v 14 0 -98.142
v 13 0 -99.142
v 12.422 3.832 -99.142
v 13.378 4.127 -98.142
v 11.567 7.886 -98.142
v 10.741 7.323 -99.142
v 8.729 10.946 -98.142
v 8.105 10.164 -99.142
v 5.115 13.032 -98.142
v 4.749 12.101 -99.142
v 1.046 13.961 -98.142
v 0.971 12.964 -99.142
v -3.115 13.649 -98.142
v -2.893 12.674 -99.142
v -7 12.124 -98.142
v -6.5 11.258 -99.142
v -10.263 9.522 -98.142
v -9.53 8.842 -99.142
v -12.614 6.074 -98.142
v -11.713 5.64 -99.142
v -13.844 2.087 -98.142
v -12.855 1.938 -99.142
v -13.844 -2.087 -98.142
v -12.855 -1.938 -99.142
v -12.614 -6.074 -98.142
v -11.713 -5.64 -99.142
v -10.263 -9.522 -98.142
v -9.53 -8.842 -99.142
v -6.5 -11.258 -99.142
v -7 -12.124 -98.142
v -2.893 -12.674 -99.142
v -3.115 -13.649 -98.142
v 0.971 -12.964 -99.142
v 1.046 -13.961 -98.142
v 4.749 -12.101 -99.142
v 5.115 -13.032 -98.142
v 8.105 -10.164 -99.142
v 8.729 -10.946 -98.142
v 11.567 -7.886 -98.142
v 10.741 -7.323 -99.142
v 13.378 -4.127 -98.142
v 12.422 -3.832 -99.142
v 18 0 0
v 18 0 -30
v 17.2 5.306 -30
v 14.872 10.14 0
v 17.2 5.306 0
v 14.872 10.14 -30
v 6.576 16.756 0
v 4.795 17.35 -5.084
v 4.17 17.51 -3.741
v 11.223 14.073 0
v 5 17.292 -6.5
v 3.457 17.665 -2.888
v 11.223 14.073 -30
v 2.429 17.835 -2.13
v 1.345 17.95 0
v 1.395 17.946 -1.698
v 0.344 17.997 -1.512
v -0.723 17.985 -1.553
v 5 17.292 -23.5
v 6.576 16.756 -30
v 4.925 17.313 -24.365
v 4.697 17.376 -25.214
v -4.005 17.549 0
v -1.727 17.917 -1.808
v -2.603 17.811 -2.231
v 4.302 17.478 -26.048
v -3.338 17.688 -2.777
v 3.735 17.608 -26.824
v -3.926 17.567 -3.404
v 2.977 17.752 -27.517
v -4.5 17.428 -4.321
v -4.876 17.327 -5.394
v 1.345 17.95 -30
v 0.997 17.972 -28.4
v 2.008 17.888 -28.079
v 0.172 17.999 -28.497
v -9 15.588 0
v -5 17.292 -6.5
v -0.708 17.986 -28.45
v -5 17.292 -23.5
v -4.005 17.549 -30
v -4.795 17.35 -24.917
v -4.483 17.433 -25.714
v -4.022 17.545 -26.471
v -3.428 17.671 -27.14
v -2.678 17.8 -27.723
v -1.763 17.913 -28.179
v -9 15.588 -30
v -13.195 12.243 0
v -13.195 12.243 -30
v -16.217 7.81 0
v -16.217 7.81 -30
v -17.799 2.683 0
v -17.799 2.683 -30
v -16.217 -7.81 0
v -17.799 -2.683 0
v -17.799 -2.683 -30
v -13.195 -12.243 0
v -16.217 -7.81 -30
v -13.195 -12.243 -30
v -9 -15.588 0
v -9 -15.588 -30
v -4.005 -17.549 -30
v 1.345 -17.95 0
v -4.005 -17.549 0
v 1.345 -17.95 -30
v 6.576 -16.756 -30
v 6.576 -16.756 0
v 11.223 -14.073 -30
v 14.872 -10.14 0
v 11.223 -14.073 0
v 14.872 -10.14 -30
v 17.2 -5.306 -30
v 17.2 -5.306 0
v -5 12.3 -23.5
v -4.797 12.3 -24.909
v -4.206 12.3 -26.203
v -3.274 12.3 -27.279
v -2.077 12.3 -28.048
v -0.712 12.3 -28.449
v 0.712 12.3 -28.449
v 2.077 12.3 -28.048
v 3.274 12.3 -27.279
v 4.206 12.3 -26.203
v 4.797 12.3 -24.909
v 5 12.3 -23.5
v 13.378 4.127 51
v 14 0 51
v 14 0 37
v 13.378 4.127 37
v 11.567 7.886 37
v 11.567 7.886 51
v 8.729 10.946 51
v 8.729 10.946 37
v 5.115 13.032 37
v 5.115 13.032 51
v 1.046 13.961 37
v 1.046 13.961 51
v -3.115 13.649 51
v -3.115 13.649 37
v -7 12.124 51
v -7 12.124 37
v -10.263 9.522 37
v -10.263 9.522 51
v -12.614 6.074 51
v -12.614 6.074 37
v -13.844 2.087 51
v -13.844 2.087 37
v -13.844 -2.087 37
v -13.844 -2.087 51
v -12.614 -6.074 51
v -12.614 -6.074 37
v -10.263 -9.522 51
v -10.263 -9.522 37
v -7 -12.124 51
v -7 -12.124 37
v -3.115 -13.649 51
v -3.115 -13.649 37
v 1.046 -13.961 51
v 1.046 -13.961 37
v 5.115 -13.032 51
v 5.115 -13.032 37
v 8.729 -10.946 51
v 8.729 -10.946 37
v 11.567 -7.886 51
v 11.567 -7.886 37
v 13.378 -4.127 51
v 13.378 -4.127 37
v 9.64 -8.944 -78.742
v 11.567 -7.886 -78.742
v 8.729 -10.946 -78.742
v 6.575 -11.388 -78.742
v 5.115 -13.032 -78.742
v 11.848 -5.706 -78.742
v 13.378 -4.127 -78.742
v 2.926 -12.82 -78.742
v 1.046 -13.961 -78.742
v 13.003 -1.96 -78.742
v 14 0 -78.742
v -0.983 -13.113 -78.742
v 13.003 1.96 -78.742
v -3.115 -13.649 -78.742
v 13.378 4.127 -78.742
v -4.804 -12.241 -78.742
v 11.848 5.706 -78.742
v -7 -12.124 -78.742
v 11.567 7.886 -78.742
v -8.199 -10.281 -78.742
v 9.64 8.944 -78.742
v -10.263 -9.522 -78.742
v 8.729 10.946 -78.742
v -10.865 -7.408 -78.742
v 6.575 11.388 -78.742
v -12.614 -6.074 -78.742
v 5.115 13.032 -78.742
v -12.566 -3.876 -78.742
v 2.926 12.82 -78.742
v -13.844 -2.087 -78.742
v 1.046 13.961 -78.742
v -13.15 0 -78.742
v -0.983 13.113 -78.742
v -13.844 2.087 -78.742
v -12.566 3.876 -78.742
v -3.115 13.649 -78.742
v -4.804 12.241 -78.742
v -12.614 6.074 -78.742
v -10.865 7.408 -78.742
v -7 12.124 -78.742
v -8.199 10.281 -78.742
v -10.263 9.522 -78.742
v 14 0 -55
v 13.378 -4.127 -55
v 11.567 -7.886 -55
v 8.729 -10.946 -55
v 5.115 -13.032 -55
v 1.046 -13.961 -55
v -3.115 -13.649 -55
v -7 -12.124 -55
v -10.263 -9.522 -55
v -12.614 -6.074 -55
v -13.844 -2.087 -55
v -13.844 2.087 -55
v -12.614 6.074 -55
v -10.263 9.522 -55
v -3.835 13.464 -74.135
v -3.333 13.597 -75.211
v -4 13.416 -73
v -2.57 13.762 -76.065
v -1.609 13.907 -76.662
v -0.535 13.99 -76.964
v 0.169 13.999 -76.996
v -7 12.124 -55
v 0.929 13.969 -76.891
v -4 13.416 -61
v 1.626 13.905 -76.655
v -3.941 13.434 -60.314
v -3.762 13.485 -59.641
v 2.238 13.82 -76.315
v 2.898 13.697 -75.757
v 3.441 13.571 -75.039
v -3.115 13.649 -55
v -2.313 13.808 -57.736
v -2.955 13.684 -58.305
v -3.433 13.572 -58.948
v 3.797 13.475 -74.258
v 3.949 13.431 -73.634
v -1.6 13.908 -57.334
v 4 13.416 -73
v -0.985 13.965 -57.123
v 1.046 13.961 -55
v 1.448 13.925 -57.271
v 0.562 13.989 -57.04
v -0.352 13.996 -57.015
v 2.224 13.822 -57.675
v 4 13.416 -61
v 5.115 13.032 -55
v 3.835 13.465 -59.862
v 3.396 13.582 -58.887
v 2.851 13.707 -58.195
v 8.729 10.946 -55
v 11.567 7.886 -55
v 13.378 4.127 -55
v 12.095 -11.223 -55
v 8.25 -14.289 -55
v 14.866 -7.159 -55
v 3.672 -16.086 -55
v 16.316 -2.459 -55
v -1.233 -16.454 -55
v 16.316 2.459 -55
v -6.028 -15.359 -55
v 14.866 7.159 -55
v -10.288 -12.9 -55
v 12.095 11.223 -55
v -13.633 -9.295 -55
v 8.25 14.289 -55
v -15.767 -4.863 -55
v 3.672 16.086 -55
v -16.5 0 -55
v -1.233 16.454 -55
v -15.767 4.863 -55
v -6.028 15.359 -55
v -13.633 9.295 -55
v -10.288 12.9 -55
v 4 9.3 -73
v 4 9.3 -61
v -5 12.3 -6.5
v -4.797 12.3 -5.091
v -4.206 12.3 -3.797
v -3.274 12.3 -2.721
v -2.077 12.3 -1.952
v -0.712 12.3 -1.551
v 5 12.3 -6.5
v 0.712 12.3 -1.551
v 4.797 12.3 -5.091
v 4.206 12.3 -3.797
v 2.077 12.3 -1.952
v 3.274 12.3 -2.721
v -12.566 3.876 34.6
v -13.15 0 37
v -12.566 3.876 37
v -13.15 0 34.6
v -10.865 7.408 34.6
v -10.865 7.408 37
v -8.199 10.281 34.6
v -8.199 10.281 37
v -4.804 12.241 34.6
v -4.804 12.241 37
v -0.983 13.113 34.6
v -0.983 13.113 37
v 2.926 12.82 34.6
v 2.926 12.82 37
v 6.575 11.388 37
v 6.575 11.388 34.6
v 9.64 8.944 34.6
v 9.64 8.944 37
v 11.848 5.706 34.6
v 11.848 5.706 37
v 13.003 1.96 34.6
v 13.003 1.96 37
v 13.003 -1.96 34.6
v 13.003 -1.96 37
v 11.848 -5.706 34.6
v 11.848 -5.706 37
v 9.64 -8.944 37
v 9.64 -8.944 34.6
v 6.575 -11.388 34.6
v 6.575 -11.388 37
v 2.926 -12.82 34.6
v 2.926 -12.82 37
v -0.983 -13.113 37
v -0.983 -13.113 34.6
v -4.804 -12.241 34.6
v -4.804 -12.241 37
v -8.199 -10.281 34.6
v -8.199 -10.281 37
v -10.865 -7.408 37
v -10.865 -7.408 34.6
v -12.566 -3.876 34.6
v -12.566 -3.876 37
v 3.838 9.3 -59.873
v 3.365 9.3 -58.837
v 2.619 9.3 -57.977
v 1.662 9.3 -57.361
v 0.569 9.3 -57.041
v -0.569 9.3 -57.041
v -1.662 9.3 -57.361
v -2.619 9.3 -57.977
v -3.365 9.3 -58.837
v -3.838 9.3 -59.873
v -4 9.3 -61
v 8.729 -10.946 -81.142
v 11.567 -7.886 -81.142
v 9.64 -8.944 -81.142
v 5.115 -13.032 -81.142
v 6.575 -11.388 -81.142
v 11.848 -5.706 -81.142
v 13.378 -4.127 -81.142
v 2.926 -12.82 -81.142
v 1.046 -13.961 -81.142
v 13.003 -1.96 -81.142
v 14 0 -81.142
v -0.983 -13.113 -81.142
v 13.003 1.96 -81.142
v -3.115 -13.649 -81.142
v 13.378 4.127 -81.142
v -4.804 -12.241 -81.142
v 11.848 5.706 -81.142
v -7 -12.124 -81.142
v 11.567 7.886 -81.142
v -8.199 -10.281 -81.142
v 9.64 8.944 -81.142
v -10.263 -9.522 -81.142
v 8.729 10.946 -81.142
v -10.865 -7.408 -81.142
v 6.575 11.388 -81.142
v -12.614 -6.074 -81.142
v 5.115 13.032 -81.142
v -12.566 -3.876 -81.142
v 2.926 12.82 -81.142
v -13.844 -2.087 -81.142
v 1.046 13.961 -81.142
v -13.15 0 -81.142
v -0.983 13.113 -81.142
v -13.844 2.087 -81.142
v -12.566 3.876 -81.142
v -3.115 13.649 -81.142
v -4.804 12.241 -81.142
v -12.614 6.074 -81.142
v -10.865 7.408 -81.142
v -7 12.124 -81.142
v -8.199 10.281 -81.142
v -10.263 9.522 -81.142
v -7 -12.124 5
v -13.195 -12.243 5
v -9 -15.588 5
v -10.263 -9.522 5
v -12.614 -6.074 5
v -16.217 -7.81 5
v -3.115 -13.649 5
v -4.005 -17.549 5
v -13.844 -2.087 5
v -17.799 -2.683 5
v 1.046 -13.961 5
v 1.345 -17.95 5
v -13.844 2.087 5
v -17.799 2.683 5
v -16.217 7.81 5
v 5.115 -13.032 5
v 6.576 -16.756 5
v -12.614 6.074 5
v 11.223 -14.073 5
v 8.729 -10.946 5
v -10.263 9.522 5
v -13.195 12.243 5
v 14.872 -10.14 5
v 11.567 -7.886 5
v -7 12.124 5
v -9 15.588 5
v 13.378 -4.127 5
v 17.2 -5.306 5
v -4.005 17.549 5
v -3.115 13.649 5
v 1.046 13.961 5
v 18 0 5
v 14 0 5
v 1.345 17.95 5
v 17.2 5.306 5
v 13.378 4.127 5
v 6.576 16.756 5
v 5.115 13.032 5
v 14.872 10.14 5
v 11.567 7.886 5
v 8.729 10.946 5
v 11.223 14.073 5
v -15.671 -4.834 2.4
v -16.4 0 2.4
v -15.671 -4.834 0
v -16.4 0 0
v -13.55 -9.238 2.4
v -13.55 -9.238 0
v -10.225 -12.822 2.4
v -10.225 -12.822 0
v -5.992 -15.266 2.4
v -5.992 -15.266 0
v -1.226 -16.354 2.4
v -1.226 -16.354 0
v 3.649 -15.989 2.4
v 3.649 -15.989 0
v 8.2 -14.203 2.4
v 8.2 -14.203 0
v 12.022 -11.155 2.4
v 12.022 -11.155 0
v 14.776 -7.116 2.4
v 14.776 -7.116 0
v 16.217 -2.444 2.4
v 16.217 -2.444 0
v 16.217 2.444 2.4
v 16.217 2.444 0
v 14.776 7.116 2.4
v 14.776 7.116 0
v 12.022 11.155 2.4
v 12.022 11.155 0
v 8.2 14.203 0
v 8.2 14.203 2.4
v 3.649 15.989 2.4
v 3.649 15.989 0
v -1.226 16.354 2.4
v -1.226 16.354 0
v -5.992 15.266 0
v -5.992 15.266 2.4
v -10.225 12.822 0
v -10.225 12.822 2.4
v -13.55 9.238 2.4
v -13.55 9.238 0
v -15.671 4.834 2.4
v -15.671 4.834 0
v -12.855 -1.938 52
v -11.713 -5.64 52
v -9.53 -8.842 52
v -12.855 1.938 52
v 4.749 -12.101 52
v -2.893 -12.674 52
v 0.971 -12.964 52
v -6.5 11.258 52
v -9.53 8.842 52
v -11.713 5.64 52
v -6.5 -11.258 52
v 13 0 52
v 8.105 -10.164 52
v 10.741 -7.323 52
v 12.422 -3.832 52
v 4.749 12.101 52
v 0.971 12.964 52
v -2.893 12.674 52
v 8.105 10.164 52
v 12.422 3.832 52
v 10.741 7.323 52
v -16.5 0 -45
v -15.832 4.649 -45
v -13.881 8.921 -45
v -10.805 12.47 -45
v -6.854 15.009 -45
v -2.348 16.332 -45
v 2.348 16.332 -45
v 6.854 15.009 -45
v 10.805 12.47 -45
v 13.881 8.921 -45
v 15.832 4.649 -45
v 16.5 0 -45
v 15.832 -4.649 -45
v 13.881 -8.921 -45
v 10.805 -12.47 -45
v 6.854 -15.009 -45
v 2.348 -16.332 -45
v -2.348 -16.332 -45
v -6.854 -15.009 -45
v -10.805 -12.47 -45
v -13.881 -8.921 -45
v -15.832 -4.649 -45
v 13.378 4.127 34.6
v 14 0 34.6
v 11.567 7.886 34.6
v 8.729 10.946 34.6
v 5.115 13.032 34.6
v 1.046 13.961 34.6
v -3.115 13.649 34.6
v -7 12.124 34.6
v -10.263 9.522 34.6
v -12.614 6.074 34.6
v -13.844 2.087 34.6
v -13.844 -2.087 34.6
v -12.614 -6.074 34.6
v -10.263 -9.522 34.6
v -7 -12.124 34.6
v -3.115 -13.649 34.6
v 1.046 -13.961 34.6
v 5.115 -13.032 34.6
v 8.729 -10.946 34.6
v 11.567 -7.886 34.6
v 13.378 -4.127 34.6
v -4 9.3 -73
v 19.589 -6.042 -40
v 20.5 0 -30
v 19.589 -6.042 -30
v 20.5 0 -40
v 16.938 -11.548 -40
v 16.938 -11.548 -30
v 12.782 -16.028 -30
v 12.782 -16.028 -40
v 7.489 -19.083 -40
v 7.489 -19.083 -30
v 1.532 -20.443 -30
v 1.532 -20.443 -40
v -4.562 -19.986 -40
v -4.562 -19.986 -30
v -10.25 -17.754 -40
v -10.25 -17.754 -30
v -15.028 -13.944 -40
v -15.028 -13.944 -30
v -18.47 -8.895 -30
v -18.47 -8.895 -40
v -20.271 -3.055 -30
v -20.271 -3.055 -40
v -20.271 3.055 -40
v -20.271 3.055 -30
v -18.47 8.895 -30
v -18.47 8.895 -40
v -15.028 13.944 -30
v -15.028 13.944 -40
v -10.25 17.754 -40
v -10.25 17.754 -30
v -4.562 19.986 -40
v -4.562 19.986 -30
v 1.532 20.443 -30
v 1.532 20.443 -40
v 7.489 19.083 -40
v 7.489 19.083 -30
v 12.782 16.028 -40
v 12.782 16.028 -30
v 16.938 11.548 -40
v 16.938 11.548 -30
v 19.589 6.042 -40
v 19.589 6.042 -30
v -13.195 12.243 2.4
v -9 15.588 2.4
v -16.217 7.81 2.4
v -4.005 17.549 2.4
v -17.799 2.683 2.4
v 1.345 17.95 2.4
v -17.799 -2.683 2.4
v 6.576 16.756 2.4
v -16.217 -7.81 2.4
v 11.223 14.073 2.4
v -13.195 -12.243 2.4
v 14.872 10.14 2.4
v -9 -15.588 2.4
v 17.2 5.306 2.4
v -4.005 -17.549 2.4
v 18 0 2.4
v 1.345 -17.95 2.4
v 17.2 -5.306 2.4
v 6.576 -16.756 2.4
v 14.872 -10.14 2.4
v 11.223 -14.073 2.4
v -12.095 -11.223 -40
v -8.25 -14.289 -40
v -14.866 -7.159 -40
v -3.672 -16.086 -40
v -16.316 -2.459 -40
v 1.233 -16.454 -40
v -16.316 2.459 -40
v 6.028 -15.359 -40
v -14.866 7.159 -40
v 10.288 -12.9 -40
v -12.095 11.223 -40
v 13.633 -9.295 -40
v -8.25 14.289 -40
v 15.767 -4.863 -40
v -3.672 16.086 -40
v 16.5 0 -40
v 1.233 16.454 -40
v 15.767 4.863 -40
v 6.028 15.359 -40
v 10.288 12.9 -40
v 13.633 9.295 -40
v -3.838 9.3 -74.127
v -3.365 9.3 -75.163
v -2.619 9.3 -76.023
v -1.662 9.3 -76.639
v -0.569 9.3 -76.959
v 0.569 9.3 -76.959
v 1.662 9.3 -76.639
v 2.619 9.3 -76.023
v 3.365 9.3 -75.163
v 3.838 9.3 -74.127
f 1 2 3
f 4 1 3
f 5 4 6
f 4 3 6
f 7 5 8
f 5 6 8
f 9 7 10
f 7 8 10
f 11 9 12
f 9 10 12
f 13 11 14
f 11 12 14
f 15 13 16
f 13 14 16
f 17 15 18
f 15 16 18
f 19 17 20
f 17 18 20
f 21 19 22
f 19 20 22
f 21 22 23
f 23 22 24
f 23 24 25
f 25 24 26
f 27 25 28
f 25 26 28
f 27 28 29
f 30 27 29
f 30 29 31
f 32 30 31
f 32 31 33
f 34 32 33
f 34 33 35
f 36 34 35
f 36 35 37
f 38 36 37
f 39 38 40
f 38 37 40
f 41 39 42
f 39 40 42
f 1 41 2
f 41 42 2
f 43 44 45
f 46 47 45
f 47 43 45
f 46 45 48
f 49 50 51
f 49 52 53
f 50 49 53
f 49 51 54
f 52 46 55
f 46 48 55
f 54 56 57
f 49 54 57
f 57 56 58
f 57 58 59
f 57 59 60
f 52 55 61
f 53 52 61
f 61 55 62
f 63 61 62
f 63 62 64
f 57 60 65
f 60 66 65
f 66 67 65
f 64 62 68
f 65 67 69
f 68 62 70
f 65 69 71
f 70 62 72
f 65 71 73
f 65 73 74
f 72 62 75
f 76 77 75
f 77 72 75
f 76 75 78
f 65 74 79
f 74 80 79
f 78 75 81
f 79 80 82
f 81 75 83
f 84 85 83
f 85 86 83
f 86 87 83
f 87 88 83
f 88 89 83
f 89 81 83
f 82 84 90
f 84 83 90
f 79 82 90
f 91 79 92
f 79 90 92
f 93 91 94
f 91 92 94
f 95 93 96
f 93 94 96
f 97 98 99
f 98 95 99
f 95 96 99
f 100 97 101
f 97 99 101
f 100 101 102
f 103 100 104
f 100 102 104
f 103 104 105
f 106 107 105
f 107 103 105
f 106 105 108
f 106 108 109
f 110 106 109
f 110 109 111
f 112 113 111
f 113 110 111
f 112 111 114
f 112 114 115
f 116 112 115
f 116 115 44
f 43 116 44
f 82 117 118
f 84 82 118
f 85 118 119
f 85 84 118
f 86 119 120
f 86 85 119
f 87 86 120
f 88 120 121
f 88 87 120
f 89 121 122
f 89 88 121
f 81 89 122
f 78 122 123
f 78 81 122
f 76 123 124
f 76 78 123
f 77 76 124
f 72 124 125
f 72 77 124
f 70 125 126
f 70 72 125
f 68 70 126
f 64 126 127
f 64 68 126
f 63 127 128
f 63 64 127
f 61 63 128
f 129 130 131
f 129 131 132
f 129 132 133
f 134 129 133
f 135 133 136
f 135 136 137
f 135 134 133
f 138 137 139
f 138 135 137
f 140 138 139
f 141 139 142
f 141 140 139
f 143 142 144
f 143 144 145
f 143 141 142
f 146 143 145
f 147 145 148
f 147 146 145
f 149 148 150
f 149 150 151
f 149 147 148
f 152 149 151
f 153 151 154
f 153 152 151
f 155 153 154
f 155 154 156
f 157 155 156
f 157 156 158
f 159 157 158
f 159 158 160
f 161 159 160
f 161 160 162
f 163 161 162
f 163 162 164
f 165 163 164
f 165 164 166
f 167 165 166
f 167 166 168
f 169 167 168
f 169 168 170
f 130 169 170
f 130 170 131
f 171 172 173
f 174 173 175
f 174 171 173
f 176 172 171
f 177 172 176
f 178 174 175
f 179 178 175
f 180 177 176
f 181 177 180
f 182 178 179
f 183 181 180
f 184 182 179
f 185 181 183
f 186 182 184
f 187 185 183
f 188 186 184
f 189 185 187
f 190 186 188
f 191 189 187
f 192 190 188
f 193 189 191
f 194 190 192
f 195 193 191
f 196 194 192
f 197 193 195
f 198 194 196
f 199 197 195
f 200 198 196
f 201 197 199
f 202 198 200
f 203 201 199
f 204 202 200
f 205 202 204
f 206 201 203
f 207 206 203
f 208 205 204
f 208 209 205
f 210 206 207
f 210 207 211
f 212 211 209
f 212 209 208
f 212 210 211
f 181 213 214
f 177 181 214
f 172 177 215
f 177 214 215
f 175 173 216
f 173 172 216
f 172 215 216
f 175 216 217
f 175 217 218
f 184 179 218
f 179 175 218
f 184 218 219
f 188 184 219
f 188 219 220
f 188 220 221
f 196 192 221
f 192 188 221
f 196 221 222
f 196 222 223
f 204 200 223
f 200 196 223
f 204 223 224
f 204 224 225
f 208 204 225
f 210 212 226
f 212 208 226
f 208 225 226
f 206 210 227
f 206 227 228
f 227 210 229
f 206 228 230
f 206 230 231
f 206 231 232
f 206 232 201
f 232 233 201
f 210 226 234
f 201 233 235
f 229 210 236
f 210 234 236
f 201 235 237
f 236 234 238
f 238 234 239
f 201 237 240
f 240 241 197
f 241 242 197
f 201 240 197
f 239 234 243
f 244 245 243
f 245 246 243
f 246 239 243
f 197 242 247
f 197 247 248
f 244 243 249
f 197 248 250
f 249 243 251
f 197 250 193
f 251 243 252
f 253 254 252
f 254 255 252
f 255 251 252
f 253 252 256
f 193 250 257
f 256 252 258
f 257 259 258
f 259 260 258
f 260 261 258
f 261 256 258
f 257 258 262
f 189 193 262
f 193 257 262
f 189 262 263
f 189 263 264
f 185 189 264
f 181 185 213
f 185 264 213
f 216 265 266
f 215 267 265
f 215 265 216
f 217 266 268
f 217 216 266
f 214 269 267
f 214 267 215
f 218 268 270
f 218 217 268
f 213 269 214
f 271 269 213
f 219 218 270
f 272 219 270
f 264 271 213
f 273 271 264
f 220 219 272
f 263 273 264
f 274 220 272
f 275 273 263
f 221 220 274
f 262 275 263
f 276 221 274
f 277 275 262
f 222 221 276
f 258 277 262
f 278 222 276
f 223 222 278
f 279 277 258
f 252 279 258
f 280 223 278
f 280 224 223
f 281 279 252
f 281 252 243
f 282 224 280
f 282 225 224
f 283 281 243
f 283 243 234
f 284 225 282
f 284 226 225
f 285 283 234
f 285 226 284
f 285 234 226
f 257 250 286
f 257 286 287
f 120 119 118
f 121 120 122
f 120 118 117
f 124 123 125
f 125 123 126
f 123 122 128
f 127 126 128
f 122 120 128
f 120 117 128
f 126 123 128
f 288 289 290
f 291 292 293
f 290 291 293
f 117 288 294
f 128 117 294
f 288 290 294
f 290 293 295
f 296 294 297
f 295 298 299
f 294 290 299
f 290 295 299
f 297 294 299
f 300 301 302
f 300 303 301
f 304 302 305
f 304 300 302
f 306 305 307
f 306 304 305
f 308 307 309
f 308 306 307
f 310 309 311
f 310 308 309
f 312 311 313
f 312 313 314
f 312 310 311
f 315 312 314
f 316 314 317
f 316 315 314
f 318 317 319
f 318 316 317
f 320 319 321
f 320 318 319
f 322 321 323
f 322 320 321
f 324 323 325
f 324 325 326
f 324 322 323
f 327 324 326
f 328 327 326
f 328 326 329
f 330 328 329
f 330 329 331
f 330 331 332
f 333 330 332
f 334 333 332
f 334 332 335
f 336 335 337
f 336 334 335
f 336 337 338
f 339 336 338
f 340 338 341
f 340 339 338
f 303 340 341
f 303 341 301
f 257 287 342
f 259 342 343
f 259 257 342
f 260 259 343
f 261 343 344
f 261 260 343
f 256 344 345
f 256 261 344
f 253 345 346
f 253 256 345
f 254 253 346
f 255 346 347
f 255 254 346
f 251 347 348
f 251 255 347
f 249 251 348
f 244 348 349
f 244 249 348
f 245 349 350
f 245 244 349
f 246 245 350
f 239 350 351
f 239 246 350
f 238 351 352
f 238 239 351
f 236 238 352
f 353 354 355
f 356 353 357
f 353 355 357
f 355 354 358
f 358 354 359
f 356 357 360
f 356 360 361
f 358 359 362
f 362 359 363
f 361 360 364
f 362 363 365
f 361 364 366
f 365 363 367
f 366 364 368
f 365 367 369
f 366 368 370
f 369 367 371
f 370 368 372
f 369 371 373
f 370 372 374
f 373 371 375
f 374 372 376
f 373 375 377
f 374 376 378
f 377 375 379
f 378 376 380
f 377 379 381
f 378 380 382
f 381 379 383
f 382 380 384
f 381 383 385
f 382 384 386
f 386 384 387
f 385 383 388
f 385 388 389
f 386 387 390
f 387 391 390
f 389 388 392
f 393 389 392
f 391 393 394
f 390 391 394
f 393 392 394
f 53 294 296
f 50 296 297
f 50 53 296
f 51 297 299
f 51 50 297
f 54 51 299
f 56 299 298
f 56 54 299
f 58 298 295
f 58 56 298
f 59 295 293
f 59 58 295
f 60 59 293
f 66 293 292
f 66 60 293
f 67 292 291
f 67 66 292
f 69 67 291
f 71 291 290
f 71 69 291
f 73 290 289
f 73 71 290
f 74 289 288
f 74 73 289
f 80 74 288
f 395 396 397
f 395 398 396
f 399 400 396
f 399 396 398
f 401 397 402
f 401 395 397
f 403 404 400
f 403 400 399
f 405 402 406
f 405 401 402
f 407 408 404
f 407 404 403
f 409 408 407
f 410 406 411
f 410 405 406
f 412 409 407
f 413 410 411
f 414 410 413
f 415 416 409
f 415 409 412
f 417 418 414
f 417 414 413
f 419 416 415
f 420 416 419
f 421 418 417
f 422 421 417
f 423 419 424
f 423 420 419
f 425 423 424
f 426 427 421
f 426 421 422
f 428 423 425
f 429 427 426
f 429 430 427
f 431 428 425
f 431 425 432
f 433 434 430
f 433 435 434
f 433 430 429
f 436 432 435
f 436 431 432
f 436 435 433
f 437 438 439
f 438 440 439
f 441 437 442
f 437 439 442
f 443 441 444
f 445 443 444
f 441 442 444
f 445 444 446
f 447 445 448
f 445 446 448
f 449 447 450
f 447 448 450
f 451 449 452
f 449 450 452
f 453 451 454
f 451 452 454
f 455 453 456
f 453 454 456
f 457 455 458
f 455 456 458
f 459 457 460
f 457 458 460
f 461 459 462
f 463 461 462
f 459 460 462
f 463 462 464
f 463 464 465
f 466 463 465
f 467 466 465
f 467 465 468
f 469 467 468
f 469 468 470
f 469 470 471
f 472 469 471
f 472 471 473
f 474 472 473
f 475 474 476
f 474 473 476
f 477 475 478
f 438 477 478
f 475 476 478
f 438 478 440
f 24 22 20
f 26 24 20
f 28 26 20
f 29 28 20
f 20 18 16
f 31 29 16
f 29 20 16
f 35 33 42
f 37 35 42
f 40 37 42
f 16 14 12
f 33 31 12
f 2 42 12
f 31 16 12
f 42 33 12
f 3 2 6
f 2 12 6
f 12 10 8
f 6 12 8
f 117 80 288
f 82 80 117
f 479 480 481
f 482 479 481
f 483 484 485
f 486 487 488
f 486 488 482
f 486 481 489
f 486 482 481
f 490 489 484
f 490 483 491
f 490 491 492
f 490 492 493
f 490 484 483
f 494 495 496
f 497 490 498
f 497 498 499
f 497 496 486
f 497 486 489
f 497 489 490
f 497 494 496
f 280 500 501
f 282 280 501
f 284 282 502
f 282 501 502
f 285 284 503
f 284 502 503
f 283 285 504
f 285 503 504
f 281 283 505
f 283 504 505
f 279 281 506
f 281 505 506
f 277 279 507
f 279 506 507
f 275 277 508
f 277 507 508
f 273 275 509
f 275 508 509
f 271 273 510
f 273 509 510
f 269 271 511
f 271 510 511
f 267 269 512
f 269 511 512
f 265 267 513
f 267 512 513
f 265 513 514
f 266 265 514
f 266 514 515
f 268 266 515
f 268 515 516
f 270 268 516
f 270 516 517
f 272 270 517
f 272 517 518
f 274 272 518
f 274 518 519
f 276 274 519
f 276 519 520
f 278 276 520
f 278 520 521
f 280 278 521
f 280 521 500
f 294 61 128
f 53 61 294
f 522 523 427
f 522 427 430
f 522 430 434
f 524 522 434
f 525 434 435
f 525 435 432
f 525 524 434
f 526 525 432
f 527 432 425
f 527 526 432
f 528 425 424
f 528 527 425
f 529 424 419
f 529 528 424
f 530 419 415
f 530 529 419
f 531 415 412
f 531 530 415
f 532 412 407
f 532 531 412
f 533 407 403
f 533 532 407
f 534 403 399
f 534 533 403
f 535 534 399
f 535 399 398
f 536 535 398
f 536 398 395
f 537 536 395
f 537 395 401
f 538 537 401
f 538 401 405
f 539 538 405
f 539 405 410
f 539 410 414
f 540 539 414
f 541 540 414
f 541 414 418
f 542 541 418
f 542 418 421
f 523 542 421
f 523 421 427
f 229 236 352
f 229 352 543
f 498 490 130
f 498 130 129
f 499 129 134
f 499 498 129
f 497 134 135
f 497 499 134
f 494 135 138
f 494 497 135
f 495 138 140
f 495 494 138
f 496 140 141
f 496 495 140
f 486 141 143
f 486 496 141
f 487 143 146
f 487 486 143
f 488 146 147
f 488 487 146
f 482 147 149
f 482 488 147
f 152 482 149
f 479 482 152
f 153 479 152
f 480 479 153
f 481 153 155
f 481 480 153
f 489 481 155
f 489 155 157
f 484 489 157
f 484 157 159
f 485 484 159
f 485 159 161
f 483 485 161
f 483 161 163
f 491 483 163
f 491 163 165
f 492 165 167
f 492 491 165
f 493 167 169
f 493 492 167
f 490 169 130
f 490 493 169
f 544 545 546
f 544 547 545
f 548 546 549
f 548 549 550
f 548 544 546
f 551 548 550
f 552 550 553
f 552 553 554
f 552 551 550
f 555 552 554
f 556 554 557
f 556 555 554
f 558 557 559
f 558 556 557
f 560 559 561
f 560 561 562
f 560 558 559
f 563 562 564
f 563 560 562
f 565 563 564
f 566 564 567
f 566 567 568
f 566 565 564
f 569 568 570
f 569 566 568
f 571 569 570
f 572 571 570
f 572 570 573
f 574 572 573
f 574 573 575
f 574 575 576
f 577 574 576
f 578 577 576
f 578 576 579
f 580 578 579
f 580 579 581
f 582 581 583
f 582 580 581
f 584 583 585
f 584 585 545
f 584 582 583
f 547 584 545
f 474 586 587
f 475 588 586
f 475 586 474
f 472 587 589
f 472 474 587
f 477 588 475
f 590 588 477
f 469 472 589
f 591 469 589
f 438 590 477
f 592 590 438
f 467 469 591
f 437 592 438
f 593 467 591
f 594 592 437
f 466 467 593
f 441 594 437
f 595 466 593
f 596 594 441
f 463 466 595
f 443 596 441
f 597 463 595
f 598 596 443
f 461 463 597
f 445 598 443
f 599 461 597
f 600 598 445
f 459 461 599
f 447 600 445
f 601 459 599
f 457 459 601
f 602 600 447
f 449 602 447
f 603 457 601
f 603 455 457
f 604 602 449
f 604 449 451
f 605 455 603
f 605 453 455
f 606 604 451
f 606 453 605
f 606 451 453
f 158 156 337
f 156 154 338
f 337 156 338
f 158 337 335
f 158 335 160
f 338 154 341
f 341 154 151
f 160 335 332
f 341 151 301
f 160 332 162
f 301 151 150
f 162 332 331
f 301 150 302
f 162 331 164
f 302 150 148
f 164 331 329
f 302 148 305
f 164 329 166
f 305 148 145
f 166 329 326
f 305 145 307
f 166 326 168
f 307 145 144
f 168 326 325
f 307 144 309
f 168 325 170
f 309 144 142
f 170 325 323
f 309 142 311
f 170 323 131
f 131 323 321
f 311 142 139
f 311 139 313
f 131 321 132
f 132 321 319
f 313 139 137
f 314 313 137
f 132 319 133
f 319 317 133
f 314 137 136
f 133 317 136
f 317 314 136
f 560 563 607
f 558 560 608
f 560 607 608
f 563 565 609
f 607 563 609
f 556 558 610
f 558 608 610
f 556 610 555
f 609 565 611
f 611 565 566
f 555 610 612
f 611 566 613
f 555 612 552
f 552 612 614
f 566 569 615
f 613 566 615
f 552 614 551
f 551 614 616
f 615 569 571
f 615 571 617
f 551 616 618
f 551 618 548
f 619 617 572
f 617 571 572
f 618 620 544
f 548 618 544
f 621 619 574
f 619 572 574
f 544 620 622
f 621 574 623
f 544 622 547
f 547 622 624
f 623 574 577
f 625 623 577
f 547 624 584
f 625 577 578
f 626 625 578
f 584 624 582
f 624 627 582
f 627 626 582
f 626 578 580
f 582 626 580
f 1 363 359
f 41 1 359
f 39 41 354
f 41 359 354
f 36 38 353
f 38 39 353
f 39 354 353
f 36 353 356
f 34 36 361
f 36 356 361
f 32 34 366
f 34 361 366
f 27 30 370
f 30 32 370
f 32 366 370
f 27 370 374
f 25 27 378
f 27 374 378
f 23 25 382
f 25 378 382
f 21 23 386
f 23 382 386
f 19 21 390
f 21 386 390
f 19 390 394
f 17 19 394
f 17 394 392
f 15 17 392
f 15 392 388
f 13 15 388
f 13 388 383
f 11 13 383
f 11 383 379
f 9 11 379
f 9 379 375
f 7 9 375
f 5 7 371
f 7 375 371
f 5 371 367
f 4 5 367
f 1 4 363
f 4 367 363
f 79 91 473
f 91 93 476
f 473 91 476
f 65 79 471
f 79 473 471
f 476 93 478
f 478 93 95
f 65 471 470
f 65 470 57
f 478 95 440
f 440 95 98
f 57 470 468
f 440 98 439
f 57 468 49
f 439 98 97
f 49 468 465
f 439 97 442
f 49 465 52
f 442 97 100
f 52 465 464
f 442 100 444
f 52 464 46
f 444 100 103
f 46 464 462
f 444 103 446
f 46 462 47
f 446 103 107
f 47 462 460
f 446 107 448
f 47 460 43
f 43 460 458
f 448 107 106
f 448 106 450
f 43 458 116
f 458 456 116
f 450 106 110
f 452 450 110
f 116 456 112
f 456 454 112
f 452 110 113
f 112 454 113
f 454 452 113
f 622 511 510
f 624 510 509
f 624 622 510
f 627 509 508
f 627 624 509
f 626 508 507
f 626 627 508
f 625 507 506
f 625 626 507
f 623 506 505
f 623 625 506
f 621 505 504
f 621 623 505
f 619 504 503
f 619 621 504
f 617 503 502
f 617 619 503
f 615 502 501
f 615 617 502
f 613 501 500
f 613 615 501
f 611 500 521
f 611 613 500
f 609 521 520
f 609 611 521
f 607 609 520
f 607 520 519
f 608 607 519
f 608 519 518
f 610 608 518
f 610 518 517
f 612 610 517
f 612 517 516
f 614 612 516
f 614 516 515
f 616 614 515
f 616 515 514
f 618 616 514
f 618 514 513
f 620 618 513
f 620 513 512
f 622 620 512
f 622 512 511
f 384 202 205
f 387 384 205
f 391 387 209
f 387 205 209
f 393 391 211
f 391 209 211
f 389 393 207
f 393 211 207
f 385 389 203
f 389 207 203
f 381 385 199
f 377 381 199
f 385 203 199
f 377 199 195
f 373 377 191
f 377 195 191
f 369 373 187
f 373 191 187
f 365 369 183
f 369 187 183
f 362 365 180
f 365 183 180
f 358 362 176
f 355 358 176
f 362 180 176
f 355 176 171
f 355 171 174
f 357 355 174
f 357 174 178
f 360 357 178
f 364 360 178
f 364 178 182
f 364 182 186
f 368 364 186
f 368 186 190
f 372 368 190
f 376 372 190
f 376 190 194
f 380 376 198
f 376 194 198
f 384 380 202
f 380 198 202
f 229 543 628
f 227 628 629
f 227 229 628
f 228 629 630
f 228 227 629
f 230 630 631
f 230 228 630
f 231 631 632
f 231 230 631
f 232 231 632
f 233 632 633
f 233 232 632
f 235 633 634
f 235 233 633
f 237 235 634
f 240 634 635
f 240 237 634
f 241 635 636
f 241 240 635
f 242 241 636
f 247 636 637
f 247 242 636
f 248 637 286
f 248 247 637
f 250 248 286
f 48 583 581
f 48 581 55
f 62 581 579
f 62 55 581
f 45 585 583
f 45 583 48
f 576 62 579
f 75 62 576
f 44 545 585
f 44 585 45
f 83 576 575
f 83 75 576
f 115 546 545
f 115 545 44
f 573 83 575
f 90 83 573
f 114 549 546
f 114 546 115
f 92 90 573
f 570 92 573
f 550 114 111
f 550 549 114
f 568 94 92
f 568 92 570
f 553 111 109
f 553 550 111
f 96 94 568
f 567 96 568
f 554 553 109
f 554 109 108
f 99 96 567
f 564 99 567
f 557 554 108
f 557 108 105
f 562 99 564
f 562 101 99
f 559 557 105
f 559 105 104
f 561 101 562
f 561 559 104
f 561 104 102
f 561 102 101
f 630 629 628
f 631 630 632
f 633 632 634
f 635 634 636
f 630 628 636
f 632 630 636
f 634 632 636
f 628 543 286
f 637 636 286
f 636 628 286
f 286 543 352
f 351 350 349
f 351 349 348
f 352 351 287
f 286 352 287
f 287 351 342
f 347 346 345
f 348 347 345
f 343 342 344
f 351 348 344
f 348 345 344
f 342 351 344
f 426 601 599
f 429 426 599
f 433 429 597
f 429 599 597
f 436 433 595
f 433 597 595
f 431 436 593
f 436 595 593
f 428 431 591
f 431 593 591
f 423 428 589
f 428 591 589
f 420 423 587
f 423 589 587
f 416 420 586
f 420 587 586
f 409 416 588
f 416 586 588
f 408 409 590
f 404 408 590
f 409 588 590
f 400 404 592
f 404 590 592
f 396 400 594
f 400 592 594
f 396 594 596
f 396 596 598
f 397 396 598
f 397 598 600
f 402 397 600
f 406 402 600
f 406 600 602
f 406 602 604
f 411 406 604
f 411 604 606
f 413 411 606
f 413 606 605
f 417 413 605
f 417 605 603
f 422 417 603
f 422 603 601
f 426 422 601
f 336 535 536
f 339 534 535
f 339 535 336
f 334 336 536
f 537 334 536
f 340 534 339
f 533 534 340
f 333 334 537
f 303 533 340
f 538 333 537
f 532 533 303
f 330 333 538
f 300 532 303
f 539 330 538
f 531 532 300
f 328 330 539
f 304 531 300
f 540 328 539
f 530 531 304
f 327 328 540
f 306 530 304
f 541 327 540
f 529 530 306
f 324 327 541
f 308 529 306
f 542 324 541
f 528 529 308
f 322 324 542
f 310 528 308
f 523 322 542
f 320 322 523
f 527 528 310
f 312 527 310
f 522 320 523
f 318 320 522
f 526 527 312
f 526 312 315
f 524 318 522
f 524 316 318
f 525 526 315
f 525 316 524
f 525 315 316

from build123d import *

# Parameters (mm, degrees)
BOSS_EXTRUDE1_DEPTH      = 5
BOSS_EXTRUDE1_DEPTH_BACK = 40
SKETCH1_R                = 18
SKETCH2_R                = 14
BOSS_EXTRUDE2_DEPTH      = 45
SKETCH3_R                = 14
BOSS_EXTRUDE3_DEPTH      = 15
BOSS_EXTRUDE4_START      = 47
SKETCH4_R                = 14
BOSS_EXTRUDE4_DEPTH      = 47
CUT_EXTRUDE1_START       = 1
CUT_EXTRUDE1_DEPTH       = 8
CUT_EXTRUDE2_DEPTH       = 8
SKETCH7_W                = 5.778552493
SKETCH7_H                = 10
SKETCH8_W                = 8.791380579
SKETCH8_H                = 2.4
CUT_EXTRUDE3_START       = -5
SKETCH12_R               = 15.75679301
SKETCH12_R_2             = 13.15
CUT_EXTRUDE3_DEPTH       = 2.4
BOSS_EXTRUDE5_START      = 25
SKETCH11_R               = 16.5
SKETCH11_R_2             = 14
BOSS_EXTRUDE5_DEPTH      = 10
SKETCH15_W               = 6.233882618
SKETCH15_H               = 2.4
CHAMFER1_SIZE            = 1
SKETCH16_R               = 16.5
BOSS_EXTRUDE6_DEPTH      = 10


with BuildPart() as part:
    # Sketch1 → Boss-Extrude1 (new, two sides: drawn at the far end of the back side and taken through both)
    with BuildSketch(Plane.XY.offset(-BOSS_EXTRUDE1_DEPTH_BACK)):
        Circle(SKETCH1_R)
    extrude(amount=BOSS_EXTRUDE1_DEPTH + BOSS_EXTRUDE1_DEPTH_BACK)

    # Sketch2 → Boss-Extrude2 (add)
    with BuildSketch(Plane(origin=(0, 0, -40), x_dir=(-1, 0, 0), z_dir=(0, 0, -1))):
        with Locations(Location((0, 0, 0), (0, 0, 180))):
            Circle(SKETCH2_R)
    extrude(amount=BOSS_EXTRUDE2_DEPTH)

    # Sketch3 → Boss-Extrude3 (add)
    with BuildSketch(Plane(origin=(0, 0, -85), x_dir=(-1, 0, 0), z_dir=(0, 0, -1))):
        with Locations(Location((0, 0, 0), (0, 0, 180))):
            Circle(SKETCH3_R)
    extrude(amount=BOSS_EXTRUDE3_DEPTH)

    # Sketch4 → Boss-Extrude4 (add)
    with BuildSketch(Plane.XY.offset(5).offset(BOSS_EXTRUDE4_START)):
        Circle(SKETCH4_R)
    extrude(amount=-BOSS_EXTRUDE4_DEPTH)

    # Sketch5 → Cut-Extrude1 (cut)
    with BuildSketch(Plane.XZ.offset(-21.3).offset(CUT_EXTRUDE1_START)):
        with BuildLine():
            Line((-5, -6.5), (-5, -23.5))
            ThreePointArc((-5, -23.5), (0, -28.5), (5, -23.5))
            Line((5, -23.5), (5, -6.5))
            ThreePointArc((5, -6.5), (0, -1.5), (-5, -6.5))
        make_face()
    extrude(amount=CUT_EXTRUDE1_DEPTH, mode=Mode.SUBTRACT)

    # Sketch6 → Cut-Extrude2 (cut)
    with BuildSketch(Plane.XZ.offset(-17.3)):
        with BuildLine():
            Line((-4, -61), (-4, -73))
            ThreePointArc((-4, -73), (0, -77), (4, -73))
            Line((4, -73), (4, -61))
            ThreePointArc((4, -61), (0, -57), (-4, -61))
        make_face()
    extrude(amount=CUT_EXTRUDE2_DEPTH, mode=Mode.SUBTRACT)

    # Sketch7 → Revolve1 (revolve)
    with BuildSketch(Plane(origin=(0, 0, 0), x_dir=(1, 0, 0), z_dir=(0, 1, 0))):
        with Locations((17.610723754, 35)):
            Rectangle(SKETCH7_W, SKETCH7_H)
    revolve(axis=Axis((0, 0, -30.114461013), (0, 0, -1)))

    # Sketch8 → Cut-Revolve1 (revolve, cut)
    with BuildSketch(Plane(origin=(0, 0, 0), x_dir=(1, 0, 0), z_dir=(0, 1, 0)), mode=Mode.PRIVATE) as cut_revolve1_sk:
        with Locations((20.79569029, -1.2)):
            Rectangle(SKETCH8_W, SKETCH8_H)
    revolve(cut_revolve1_sk.sketch.rotate(Axis((0, 0, 0), (0, 0, 1)), 180), axis=Axis((0, 0, 0), (0, 0, 1)), mode=Mode.SUBTRACT)

    # Sketch12 → Cut-Extrude3 (cut)
    with BuildSketch(Plane(origin=(0, 0, -83.741663421), x_dir=(-1, 0, 0), z_dir=(0, 0, -1)).offset(CUT_EXTRUDE3_START)):
        Circle(SKETCH12_R)
        Circle(SKETCH12_R_2, mode=Mode.SUBTRACT)
    extrude(amount=CUT_EXTRUDE3_DEPTH, mode=Mode.SUBTRACT)

    # Sketch11 → Boss-Extrude5 (add)
    with BuildSketch(Plane.XY.offset(-60).offset(BOSS_EXTRUDE5_START)):
        Circle(SKETCH11_R)
        Circle(SKETCH11_R_2, mode=Mode.SUBTRACT)
    extrude(amount=-BOSS_EXTRUDE5_DEPTH)

    # Sketch15 → Cut-Revolve2 (revolve, cut)
    with BuildSketch(Plane(origin=(0, 0, 0), x_dir=(1, 0, 0), z_dir=(0, 1, 0)), mode=Mode.PRIVATE) as cut_revolve2_sk:
        with Locations((16.266941309, -35.8)):
            Rectangle(SKETCH15_W, SKETCH15_H)
    revolve(cut_revolve2_sk.sketch.rotate(Axis((0, 0, 52), (0, 0, -1)), 180), axis=Axis((0, 0, 52), (0, 0, -1)), mode=Mode.SUBTRACT)

    # SurfaceCut1
    split(bisect_by=Plane.XY.offset(-99.141663421), keep=Keep.TOP)

    # Chamfer1
    chamfer1_edges = [part.edges().sort_by_distance(p)[0] for p in [
        (-14, 0, 52),
        (-14, 0, -99.141663421),
    ]]
    chamfer(chamfer1_edges, length=CHAMFER1_SIZE)

    # Sketch16 → Boss-Extrude6 (add)
    with BuildSketch(Plane(origin=(0, 0, -45), x_dir=(-1, 0, 0), z_dir=(0, 0, -1))):
        Circle(SKETCH16_R)
    extrude(amount=BOSS_EXTRUDE6_DEPTH)


solid = part.part
